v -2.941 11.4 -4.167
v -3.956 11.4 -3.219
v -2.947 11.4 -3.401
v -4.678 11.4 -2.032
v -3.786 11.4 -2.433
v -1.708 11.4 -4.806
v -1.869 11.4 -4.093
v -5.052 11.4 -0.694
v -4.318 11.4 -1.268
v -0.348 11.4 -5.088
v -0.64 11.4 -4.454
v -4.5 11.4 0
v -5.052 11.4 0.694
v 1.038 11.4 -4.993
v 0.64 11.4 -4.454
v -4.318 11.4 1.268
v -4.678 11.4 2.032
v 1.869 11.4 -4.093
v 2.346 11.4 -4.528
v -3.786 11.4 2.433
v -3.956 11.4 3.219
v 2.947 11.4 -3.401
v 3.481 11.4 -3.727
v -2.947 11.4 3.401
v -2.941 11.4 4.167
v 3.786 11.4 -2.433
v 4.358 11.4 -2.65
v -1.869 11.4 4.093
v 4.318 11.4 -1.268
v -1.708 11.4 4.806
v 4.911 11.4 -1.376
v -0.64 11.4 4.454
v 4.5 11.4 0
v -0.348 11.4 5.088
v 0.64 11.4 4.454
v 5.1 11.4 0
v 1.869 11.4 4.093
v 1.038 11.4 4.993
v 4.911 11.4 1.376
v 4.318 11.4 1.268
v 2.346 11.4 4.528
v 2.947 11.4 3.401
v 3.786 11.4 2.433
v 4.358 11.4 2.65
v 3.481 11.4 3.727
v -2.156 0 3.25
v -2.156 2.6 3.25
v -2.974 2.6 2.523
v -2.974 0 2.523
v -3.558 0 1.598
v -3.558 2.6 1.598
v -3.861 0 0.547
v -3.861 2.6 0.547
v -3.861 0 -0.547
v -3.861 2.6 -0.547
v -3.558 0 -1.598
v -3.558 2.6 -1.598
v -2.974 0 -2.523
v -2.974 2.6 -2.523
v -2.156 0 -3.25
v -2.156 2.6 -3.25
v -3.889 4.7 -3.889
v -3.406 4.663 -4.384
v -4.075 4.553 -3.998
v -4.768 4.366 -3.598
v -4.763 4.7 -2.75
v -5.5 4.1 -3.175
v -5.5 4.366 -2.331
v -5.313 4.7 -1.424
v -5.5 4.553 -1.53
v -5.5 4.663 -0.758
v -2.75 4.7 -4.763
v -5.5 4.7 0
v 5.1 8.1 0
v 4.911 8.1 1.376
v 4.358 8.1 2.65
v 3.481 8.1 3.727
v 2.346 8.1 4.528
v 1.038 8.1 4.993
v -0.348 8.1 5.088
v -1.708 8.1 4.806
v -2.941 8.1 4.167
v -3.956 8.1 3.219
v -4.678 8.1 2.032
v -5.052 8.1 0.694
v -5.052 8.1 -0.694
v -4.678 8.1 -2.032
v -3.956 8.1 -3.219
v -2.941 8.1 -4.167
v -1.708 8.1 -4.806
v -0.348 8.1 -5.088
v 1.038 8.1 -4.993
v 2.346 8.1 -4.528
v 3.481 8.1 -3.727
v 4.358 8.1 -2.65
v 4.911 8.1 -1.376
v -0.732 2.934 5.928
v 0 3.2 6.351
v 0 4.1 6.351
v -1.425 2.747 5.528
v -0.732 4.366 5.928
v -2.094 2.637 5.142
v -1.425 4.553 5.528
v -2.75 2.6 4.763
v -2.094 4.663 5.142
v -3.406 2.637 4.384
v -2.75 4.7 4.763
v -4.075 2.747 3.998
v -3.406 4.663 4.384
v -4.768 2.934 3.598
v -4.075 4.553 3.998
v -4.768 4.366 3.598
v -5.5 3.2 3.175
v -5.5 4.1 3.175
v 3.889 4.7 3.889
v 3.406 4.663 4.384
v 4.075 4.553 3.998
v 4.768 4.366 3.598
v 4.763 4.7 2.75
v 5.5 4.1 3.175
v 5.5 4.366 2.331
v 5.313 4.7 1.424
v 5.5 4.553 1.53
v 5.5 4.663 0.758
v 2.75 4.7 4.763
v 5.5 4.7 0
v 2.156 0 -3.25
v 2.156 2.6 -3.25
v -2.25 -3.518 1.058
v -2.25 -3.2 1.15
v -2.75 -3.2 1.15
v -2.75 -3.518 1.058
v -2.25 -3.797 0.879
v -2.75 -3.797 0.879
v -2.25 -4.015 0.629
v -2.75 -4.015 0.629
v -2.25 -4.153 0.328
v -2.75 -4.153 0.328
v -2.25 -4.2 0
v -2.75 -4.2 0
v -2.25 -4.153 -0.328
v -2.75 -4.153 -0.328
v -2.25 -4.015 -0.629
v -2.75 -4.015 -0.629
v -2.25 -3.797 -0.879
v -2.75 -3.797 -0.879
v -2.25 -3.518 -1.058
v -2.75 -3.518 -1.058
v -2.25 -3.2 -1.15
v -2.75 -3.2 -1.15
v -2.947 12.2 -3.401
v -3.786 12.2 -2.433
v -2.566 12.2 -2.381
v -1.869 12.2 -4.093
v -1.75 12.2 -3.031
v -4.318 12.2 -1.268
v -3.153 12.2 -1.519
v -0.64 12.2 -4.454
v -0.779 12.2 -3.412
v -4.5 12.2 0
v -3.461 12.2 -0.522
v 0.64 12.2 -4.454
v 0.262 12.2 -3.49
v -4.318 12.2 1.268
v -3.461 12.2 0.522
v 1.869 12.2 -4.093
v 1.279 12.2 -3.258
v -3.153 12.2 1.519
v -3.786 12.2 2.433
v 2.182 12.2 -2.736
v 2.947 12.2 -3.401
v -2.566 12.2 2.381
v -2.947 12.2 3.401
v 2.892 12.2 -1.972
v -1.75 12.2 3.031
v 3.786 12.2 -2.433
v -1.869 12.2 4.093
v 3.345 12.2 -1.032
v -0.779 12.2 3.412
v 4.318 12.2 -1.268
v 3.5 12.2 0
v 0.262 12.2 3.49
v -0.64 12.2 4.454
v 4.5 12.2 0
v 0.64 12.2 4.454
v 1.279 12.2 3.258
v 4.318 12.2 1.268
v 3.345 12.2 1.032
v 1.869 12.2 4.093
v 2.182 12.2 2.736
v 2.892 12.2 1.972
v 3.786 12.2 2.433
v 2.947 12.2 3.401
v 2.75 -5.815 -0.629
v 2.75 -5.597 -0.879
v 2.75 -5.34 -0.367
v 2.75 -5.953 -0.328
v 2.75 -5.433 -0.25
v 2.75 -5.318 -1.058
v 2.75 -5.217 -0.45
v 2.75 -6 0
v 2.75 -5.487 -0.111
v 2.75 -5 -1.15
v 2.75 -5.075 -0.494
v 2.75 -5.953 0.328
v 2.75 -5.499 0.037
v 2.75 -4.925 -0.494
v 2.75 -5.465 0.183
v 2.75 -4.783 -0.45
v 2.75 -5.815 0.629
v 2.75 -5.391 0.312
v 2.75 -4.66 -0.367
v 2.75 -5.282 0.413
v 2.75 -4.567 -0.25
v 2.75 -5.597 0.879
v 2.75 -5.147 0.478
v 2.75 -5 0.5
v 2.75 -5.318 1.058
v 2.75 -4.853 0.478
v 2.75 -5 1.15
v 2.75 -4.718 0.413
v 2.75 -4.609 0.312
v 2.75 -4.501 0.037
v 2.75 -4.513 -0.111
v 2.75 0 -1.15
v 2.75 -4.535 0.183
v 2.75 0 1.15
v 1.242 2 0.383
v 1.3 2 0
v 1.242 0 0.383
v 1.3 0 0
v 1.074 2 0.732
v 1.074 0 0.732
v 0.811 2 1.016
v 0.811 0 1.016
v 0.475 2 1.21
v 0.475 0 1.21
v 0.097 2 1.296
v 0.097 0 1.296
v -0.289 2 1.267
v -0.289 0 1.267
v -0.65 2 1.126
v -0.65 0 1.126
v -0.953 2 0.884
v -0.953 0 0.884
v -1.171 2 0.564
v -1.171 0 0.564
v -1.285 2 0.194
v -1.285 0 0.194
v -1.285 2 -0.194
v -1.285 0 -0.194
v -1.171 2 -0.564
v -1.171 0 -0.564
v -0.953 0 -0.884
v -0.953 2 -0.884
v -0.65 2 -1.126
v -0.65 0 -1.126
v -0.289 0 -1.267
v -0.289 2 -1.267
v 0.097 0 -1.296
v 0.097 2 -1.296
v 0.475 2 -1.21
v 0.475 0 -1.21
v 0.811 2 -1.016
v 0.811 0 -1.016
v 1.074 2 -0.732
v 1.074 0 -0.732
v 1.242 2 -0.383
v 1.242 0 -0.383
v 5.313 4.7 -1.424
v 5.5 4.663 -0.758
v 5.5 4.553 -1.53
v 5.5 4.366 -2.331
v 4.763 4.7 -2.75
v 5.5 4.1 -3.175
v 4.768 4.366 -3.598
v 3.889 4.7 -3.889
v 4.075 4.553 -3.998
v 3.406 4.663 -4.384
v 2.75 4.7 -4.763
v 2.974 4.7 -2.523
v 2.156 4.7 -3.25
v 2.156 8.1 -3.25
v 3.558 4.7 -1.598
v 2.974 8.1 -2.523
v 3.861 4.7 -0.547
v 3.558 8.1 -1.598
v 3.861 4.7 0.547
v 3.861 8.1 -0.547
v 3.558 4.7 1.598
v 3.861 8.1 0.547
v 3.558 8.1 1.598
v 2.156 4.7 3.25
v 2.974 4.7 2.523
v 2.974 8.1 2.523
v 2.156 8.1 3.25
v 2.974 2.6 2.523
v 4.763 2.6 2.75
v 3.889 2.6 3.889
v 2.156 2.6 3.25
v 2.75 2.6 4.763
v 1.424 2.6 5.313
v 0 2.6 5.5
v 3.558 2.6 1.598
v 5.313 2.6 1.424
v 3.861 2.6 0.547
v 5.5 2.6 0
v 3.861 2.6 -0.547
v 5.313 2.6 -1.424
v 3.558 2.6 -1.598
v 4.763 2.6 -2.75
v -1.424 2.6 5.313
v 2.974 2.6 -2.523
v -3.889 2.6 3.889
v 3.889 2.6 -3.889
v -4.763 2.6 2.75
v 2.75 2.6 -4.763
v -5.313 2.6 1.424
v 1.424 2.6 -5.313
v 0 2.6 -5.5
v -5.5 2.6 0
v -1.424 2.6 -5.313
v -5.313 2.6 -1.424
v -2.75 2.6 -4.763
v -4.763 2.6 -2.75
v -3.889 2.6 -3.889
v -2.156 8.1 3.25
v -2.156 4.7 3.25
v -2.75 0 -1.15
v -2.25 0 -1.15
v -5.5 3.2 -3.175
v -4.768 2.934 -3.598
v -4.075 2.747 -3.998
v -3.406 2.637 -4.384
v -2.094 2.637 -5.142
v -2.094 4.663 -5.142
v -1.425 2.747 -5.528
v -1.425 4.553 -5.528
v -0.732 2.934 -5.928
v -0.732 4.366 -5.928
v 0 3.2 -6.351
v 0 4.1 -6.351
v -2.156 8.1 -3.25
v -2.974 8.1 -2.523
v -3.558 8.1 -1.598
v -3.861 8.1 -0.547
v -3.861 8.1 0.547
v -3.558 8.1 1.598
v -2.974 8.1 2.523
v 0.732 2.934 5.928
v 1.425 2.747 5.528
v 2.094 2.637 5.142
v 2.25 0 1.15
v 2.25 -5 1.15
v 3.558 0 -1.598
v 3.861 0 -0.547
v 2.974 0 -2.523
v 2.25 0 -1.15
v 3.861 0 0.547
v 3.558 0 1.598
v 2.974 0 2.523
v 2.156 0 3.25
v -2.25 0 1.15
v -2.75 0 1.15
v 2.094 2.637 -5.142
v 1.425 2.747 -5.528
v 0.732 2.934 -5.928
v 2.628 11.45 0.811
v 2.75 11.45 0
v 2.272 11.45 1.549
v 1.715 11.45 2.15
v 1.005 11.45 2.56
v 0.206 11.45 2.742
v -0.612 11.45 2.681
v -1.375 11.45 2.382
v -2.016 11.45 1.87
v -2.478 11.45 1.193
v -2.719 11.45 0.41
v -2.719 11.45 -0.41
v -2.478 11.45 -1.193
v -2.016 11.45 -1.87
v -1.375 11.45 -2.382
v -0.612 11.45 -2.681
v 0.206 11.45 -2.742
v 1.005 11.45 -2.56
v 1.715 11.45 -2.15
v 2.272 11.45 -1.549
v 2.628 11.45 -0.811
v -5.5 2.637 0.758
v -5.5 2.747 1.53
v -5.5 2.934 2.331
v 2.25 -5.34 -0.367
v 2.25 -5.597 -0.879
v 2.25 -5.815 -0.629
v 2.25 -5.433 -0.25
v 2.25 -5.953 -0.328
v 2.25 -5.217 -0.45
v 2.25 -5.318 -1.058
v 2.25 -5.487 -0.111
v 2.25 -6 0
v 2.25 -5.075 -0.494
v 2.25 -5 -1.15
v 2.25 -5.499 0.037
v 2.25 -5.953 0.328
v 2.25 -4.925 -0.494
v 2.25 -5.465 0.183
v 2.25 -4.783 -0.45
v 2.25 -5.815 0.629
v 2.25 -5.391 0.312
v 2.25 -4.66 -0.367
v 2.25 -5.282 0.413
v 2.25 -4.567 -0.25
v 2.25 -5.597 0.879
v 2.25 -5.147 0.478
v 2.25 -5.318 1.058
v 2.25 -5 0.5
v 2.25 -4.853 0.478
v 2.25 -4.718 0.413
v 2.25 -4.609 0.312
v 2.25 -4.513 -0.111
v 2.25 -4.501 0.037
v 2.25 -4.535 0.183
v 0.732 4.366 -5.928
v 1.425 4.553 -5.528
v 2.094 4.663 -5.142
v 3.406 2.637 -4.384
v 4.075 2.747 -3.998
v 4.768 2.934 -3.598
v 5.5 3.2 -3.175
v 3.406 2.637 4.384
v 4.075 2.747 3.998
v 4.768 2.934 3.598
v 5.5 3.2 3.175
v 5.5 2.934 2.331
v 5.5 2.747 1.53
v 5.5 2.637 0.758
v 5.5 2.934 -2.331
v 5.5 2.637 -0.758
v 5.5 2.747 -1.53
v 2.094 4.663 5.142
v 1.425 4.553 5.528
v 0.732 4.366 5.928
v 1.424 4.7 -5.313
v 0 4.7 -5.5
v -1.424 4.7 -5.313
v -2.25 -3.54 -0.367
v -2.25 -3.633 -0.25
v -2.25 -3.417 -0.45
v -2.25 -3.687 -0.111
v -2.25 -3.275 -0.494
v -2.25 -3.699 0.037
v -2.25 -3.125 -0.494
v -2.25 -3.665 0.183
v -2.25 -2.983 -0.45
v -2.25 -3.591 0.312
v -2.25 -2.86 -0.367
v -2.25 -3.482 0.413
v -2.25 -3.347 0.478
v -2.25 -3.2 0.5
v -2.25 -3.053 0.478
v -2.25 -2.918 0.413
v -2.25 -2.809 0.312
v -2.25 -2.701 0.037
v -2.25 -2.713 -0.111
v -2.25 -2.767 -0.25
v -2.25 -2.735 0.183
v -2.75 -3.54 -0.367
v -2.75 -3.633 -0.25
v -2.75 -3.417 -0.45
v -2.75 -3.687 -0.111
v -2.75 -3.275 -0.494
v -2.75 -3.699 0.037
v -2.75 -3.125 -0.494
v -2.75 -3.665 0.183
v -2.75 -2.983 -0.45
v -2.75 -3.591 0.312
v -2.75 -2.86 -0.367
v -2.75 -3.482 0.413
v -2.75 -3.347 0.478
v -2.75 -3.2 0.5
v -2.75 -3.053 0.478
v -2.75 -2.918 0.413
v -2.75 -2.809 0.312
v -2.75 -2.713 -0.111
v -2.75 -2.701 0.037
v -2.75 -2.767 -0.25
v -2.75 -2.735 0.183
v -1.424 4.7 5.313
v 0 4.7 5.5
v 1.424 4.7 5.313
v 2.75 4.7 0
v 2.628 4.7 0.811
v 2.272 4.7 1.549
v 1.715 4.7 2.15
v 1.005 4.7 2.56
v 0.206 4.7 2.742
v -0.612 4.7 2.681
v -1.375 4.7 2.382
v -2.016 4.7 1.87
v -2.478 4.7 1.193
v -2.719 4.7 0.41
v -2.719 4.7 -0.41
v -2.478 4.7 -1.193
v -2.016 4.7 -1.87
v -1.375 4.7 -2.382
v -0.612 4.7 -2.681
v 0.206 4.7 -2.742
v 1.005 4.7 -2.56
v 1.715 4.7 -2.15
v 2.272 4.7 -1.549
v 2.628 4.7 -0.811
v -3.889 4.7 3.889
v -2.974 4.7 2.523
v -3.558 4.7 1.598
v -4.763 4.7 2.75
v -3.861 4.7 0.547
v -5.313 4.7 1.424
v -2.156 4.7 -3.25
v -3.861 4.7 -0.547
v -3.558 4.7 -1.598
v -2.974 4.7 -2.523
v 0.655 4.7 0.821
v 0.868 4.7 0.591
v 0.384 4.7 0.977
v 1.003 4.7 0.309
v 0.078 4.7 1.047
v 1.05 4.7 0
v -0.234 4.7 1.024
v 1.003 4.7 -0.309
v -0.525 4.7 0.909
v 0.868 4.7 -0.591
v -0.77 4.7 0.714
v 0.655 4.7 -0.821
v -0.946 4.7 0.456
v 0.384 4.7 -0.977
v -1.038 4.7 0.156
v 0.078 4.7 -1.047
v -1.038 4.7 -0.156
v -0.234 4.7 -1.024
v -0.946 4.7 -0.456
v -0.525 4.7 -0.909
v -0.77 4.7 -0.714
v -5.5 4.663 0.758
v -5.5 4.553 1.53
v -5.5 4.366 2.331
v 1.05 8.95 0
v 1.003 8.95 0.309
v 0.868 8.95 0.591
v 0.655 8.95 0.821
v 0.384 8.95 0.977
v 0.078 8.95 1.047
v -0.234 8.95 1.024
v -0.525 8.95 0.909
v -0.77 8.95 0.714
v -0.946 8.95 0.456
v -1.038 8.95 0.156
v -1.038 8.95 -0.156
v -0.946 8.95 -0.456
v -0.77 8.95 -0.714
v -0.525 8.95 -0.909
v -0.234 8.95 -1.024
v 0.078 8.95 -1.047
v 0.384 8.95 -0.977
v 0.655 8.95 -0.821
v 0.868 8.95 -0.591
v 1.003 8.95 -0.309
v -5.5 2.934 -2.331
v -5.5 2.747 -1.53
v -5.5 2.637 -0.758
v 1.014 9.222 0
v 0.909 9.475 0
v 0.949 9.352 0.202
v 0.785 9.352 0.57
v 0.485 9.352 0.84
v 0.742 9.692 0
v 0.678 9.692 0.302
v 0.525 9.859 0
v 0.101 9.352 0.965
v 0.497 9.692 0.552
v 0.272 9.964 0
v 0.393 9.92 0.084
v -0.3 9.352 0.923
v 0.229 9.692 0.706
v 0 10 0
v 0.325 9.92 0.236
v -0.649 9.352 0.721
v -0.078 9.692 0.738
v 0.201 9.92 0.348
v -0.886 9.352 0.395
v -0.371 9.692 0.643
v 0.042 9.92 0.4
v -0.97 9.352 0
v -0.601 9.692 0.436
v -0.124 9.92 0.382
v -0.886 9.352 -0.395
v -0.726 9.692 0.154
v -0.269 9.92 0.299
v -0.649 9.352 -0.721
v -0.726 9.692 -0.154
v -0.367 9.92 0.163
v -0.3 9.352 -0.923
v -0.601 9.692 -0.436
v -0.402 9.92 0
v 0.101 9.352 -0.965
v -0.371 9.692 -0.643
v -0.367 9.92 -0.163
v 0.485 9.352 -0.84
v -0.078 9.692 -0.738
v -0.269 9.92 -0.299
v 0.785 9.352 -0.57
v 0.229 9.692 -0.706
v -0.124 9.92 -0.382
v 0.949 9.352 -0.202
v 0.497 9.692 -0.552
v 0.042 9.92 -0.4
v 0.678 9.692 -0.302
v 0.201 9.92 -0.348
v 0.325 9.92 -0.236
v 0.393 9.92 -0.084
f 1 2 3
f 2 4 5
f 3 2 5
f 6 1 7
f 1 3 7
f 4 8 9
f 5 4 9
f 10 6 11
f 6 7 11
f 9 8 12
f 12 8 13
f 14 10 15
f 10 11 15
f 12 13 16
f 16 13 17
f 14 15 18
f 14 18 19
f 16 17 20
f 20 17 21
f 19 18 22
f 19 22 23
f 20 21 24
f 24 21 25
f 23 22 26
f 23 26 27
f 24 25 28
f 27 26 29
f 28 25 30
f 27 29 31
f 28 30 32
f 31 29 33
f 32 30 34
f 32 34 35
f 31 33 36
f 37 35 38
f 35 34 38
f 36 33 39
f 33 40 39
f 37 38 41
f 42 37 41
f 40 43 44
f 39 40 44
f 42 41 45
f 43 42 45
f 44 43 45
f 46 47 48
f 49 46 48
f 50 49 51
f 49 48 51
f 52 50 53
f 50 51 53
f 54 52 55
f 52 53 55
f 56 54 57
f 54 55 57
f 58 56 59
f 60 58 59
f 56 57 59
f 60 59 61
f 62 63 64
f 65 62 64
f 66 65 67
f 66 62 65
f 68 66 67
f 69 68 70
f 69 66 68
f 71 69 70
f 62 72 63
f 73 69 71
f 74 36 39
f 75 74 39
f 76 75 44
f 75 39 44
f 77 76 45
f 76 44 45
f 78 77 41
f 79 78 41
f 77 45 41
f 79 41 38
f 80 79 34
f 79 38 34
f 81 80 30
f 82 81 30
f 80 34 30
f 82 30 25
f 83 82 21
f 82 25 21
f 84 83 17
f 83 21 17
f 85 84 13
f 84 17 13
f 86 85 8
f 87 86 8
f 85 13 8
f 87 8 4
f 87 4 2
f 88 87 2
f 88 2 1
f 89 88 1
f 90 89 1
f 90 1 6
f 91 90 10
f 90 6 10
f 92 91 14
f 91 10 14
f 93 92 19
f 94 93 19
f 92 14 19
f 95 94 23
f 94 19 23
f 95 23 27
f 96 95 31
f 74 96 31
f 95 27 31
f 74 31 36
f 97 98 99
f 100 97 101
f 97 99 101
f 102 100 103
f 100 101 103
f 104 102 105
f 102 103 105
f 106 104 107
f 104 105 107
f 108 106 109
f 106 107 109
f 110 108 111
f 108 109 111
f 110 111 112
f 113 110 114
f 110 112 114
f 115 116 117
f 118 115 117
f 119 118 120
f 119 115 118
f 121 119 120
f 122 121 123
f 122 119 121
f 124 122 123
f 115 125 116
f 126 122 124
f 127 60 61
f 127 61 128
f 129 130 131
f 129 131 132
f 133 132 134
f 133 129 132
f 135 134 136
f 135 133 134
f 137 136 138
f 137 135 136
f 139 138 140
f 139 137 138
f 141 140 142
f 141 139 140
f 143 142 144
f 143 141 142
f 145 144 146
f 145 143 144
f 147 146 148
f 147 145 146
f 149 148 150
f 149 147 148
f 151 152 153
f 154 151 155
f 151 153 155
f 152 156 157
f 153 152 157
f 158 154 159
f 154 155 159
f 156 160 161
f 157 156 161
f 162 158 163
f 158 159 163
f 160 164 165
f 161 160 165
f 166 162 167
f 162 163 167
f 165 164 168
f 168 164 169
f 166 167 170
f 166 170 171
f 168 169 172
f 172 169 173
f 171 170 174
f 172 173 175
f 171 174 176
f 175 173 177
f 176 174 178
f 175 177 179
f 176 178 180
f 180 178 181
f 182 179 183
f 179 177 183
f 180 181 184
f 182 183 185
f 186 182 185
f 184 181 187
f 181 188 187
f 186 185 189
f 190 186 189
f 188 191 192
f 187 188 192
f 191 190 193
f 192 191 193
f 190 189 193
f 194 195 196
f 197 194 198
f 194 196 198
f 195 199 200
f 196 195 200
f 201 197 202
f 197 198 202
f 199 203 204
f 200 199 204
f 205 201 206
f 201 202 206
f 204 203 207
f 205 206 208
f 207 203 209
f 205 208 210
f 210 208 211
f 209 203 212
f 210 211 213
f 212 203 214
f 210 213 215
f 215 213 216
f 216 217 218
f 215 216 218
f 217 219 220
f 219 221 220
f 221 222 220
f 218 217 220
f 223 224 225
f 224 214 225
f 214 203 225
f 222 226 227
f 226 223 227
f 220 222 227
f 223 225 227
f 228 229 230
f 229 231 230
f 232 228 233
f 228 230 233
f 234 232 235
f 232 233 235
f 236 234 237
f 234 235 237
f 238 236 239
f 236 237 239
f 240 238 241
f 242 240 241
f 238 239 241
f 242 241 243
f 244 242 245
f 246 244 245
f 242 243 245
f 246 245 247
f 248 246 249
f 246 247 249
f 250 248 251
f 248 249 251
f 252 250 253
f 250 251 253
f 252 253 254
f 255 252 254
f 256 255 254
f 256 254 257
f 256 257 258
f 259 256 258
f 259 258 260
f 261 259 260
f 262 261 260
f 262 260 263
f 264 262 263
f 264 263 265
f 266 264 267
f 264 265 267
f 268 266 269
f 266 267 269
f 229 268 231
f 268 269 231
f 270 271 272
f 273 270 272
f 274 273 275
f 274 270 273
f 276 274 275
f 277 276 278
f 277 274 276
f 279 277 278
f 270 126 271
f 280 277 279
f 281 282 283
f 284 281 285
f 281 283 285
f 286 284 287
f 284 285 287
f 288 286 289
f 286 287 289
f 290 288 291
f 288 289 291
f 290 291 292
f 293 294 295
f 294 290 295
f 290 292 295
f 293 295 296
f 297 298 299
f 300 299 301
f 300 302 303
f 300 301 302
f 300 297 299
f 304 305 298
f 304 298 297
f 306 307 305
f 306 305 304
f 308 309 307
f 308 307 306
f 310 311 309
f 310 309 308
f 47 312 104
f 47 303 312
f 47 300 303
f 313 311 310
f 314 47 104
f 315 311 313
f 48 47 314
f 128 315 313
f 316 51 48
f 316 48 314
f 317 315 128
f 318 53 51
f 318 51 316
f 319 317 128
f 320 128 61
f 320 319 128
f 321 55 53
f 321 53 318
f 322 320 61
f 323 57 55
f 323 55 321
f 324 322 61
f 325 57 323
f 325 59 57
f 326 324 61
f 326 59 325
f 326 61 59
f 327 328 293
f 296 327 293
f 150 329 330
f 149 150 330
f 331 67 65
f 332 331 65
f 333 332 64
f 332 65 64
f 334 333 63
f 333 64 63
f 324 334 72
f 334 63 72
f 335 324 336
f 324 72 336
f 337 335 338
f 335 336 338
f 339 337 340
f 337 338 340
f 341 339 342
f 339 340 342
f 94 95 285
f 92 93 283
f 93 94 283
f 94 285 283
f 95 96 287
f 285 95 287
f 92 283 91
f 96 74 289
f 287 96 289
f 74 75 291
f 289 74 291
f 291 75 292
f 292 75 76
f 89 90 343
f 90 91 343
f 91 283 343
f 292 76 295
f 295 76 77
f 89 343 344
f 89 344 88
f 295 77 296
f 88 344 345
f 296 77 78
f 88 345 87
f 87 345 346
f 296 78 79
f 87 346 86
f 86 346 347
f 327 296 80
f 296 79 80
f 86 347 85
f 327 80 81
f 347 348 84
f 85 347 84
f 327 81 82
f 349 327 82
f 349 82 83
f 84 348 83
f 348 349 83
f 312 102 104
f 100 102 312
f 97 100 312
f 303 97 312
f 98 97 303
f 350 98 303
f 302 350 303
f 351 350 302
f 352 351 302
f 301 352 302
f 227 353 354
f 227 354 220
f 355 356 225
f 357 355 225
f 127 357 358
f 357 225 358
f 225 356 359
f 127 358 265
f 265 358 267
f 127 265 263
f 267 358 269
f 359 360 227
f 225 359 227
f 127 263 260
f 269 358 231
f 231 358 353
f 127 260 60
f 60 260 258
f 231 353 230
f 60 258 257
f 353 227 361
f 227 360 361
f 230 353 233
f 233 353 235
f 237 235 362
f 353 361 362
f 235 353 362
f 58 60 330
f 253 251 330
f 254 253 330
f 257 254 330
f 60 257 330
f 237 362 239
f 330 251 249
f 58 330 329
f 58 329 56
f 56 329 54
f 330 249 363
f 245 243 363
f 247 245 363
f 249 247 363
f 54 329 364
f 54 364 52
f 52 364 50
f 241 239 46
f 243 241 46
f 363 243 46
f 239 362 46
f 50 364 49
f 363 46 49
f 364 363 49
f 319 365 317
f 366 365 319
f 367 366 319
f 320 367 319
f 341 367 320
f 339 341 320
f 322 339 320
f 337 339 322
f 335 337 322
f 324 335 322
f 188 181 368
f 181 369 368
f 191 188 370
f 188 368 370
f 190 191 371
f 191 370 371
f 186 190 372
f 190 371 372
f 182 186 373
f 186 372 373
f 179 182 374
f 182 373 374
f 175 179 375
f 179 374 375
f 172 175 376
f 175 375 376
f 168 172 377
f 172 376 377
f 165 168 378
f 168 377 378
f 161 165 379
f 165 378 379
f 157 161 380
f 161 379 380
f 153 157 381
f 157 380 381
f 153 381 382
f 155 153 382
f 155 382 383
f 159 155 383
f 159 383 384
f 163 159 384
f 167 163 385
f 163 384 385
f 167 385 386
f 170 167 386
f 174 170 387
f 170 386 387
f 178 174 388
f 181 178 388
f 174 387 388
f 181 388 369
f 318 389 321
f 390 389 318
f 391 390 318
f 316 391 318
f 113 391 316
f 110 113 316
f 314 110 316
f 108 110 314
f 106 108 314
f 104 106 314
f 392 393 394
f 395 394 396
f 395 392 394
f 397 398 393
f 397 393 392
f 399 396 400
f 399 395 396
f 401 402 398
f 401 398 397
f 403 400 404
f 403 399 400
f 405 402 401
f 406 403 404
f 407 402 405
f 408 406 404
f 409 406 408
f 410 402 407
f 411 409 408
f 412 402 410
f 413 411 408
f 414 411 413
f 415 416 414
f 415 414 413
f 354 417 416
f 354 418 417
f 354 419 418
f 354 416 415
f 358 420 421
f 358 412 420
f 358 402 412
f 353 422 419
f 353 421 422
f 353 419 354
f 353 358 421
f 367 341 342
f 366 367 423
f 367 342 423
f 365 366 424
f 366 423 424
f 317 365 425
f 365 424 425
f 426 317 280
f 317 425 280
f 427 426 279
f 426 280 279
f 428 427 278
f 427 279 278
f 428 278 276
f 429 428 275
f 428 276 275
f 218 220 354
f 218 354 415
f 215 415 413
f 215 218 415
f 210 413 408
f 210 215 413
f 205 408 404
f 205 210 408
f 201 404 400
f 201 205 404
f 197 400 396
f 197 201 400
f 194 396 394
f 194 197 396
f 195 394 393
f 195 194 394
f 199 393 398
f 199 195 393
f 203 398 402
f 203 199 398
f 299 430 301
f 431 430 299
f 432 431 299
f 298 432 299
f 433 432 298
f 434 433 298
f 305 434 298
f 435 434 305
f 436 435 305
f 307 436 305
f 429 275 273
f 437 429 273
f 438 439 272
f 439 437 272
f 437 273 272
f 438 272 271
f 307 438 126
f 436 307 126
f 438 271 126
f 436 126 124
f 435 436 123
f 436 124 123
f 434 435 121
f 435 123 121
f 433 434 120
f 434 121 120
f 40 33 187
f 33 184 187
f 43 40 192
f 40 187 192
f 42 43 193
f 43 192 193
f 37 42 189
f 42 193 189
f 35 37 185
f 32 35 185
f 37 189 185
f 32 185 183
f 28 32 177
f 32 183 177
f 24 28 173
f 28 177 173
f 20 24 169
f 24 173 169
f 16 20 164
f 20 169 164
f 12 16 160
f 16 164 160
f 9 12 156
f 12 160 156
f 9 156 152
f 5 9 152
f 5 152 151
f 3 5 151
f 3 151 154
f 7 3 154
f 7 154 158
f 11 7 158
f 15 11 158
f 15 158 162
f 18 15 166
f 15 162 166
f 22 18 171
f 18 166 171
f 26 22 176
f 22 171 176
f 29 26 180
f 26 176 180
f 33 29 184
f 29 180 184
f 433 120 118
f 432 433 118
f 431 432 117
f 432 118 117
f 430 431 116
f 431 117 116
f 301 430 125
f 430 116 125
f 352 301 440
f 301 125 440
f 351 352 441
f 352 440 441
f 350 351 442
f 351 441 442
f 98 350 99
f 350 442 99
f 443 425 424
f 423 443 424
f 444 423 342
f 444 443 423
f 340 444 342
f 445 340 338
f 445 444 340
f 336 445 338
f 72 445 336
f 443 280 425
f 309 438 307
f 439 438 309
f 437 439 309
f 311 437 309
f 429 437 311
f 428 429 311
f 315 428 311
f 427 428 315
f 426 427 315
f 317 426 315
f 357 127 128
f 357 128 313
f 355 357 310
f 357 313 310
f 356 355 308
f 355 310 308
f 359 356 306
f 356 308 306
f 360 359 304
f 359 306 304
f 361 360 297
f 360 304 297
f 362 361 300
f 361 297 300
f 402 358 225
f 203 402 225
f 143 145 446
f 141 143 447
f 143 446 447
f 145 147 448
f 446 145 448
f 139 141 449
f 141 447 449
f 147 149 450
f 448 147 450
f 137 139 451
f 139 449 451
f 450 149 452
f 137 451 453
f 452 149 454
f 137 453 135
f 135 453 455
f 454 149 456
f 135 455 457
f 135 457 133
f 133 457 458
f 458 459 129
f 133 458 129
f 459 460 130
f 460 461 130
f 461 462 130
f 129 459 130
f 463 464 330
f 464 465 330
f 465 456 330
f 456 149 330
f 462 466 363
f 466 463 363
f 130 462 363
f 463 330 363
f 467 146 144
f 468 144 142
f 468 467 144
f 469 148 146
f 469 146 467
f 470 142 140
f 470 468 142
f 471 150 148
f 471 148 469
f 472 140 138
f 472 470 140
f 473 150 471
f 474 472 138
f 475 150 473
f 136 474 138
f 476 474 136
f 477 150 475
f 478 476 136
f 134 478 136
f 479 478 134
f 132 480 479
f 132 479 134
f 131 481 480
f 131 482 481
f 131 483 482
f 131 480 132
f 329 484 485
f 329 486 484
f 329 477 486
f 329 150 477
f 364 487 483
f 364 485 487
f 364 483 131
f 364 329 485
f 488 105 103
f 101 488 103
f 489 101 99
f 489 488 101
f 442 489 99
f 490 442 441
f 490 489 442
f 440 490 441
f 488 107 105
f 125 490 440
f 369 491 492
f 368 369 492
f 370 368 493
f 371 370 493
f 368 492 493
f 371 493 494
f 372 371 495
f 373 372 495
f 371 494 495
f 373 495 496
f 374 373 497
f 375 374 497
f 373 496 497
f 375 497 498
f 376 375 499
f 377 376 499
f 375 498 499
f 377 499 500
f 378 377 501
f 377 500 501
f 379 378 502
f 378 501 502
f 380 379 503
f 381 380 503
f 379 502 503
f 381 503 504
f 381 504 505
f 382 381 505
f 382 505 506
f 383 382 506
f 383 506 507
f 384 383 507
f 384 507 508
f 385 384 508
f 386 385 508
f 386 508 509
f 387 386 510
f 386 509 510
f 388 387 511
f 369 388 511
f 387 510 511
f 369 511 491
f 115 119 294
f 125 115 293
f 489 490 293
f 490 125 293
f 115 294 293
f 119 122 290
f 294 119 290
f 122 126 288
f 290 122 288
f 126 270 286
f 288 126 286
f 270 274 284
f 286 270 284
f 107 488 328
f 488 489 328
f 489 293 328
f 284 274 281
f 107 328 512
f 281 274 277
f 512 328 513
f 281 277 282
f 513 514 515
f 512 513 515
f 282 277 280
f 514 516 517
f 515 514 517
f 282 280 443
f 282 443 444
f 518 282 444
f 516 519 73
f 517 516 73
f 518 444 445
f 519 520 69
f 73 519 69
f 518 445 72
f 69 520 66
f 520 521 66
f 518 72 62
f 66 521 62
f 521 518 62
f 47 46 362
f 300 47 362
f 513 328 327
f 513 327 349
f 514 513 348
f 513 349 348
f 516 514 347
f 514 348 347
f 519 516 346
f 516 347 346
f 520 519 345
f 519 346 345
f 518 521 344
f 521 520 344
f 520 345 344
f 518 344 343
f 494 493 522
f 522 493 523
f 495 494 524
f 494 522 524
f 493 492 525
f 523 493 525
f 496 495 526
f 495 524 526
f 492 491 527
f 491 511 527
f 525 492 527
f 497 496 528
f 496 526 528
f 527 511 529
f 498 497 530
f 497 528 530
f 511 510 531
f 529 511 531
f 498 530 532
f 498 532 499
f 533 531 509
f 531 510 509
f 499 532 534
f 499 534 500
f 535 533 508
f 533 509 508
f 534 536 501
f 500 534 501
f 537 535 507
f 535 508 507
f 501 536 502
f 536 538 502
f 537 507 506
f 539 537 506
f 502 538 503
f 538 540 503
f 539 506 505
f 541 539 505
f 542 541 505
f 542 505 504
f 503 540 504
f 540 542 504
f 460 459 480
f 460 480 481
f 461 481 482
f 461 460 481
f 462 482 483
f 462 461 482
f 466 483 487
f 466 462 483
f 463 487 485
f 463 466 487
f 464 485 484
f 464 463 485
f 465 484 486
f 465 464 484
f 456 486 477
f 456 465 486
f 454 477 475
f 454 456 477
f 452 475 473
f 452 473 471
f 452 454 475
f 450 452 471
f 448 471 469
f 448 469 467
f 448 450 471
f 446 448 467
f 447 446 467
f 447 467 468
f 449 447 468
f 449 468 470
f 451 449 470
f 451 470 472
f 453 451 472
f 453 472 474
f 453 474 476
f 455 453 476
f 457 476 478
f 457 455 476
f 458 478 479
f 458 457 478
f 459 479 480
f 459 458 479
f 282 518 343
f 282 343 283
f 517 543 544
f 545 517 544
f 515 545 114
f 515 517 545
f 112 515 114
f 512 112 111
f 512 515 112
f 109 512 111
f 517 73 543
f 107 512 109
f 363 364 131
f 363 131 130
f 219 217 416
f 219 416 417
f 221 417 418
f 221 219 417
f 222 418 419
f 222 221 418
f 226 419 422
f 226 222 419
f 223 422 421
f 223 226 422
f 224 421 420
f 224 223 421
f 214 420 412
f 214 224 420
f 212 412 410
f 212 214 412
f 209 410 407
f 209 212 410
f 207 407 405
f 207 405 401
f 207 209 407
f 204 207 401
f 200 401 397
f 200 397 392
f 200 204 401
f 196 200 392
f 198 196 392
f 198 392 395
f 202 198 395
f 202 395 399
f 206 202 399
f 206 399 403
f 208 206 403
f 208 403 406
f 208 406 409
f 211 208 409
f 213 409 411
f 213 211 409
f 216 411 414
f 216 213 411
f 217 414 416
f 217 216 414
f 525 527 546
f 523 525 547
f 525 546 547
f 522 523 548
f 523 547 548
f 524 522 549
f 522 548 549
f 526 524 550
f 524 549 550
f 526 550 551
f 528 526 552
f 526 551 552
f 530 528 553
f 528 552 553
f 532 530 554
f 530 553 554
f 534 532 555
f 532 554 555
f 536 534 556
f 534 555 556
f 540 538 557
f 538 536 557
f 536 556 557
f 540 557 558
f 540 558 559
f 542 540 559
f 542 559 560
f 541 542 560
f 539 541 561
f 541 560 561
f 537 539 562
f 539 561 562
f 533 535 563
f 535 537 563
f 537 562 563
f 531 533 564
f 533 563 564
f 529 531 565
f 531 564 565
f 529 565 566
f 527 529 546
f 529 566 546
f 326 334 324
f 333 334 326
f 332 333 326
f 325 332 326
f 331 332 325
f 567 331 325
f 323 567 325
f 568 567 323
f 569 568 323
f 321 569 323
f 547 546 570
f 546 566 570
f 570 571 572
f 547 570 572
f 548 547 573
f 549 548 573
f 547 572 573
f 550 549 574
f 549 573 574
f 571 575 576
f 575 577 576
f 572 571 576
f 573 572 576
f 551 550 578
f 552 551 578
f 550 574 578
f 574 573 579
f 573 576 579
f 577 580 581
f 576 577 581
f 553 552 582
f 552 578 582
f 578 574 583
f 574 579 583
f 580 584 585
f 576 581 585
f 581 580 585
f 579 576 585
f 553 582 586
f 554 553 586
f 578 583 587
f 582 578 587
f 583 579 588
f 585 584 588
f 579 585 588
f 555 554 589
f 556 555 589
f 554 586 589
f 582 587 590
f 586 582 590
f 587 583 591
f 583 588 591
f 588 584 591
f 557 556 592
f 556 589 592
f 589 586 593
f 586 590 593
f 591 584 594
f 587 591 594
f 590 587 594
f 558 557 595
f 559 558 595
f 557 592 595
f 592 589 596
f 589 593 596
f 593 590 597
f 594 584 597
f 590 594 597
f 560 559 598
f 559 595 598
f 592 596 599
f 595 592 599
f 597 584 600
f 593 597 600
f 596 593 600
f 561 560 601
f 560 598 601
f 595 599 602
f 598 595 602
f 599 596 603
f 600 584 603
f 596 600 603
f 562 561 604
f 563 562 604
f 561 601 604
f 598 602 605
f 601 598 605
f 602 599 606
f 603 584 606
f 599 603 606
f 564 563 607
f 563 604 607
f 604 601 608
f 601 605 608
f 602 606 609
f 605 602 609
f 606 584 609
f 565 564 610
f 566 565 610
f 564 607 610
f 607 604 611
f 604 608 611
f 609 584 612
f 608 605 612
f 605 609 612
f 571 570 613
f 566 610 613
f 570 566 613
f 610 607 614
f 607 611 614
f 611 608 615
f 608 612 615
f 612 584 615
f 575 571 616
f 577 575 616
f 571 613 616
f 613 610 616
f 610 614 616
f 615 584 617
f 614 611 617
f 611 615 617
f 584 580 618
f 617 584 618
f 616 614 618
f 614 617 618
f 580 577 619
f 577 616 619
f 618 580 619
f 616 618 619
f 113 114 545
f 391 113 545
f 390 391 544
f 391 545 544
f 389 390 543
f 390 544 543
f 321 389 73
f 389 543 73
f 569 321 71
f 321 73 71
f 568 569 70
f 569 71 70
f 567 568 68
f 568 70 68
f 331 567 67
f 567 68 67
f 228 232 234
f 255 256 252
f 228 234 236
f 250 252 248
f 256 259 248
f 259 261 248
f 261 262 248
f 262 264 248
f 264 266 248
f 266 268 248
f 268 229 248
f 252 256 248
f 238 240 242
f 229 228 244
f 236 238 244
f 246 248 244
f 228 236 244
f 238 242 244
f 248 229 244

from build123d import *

# Parameters (mm, degrees)
SKETCH2_W           = 0.5
SKETCH2_H           = 2.3
BOSS_EXTRUDE1_DEPTH = 6
CUT_EXTRUDE1_REACH  = 9.85
SKETCH3_W           = 2.3
SKETCH3_H           = 1.8
CUT_EXTRUDE2_START  = -0.5
SKETCH4_R           = 0.5
CUT_EXTRUDE2_DEPTH  = 0.5
CUT_EXTRUDE3_START  = -0.5
SKETCH5_R           = 0.5
CUT_EXTRUDE3_DEPTH  = 0.5
SKETCH6_W           = 10
SKETCH6_H           = 10
CUT_EXTRUDE4_DEPTH  = 8.1
BOSS_EXTRUDE2_DEPTH = 2.1


with BuildPart() as part:
    # Sketch1 → Revolve1 (revolve)
    with BuildSketch(Plane.XY):
        with BuildLine():
            Line((3.9, 0), (3.9, 8.1))
            Line((3.9, 8.1), (5.1, 8.1))
            Line((5.1, 8.1), (5.1, 11.4))
            Line((5.1, 11.4), (4.5, 11.4))
            Line((4.5, 11.4), (4.5, 12.2))
            Line((4.5, 12.2), (3.5, 12.2))
            Line((3.5, 12.2), (2.75, 11.45))
            Line((2.75, 11.45), (2.75, 3.2))
            Line((2.75, 3.2), (1.05, 3.2))
            Line((1.05, 3.2), (1.05, 8.95))
            ThreePointArc((1.05, 8.95), (0.74246212, 9.69246212), (0, 10))
            Line((0, 10), (0, 2))
            Line((0, 2), (1.3, 2))
            Line((1.3, 2), (1.3, 0))
            Line((1.3, 0), (3.9, 0))
        make_face()
    revolve(axis=Axis((0, 10, 0), (0, -1, 0)))

    # Sketch2 → Boss-Extrude1 (add)
    with BuildSketch(Plane.XZ):
        with Locations((2.5, 0)):
            Rectangle(SKETCH2_W, SKETCH2_H)
        with Locations((-2.5, 0)):
            Rectangle(SKETCH2_W, SKETCH2_H)
    extrude(amount=BOSS_EXTRUDE1_DEPTH)

    # Sketch3 → Cut-Extrude1 (cut, up to next)
    with BuildSketch(Plane.ZY.offset(2.75), mode=Mode.PRIVATE) as cut_extrude1_sk1:
        with Locations((0, -5.1)):
            Rectangle(SKETCH3_W, SKETCH3_H)
    cut_extrude1_tool1 = extrude(cut_extrude1_sk1.sketch, amount=-CUT_EXTRUDE1_REACH, mode=Mode.PRIVATE) & part.part
    add(cut_extrude1_tool1.solids().sort_by_distance((-2.75, -5.1, 0))[0], mode=Mode.SUBTRACT)

    # Sketch4 → Cut-Extrude2 (cut)
    with BuildSketch(Plane.ZY.offset(2.75).offset(CUT_EXTRUDE2_START)):
        with Locations((0, -3.2)):
            Circle(SKETCH4_R)
        with BuildLine():
            Line((-1.15, -3.2), (-1.15, -4.4))
            Line((-1.15, -4.4), (1.15, -4.4))
            Line((1.15, -4.4), (1.15, -3.2))
            ThreePointArc((1.15, -3.2), (0, -4.2), (-1.15, -3.2))
        make_face()
    extrude(amount=CUT_EXTRUDE2_DEPTH, mode=Mode.SUBTRACT)

    # Sketch5 → Cut-Extrude3 (cut)
    with BuildSketch(Plane.ZY.offset(-2.25).offset(CUT_EXTRUDE3_START)):
        with Locations((0, -5)):
            Circle(SKETCH5_R)
        with BuildLine():
            Line((-1.15, -5), (-1.15, -6.5))
            Line((-1.15, -6.5), (1.15, -6.5))
            Line((1.15, -6.5), (1.15, -5))
            ThreePointArc((1.15, -5), (0, -6), (-1.15, -5))
        make_face()
    extrude(amount=CUT_EXTRUDE3_DEPTH, mode=Mode.SUBTRACT)

    # Sketch6 → Cut-Extrude4 (cut)
    with BuildSketch(Plane.XZ):
        with Locations((0, 8.25)):
            Rectangle(SKETCH6_W, SKETCH6_H)
        with Locations((0, -8.25)):
            Rectangle(SKETCH6_W, SKETCH6_H)
    extrude(amount=-CUT_EXTRUDE4_DEPTH, mode=Mode.SUBTRACT)

    # Sketch7 → Boss-Extrude2 (add)
    with BuildSketch(Plane(origin=(0, 4.7, 0), x_dir=(-1, 0, 0), z_dir=(0, -1, 0))):
        Polygon((0, 6.350852961), (-5.5, 3.175426481), (-5.5, -3.175426481), (0, -6.350852961), (5.5, -3.175426481), (5.5, 3.175426481), align=None)
    extrude(amount=BOSS_EXTRUDE2_DEPTH)

    # Sketch9 → Cut-Revolve1 (revolve, cut)
    with BuildSketch(Plane(origin=(0, 0, 0), x_dir=(0, 0, -1), z_dir=(1, 0, 0))):
        Polygon((6.350852961, 4.1), (5.5, 4.7), (8.5, 4.7), (8.5, 2.6), (5.5, 2.6), (6.350852961, 3.2), align=None)
    revolve(axis=Axis((0, 0, 0), (0, 1, 0)), mode=Mode.SUBTRACT)


solid = part.part
